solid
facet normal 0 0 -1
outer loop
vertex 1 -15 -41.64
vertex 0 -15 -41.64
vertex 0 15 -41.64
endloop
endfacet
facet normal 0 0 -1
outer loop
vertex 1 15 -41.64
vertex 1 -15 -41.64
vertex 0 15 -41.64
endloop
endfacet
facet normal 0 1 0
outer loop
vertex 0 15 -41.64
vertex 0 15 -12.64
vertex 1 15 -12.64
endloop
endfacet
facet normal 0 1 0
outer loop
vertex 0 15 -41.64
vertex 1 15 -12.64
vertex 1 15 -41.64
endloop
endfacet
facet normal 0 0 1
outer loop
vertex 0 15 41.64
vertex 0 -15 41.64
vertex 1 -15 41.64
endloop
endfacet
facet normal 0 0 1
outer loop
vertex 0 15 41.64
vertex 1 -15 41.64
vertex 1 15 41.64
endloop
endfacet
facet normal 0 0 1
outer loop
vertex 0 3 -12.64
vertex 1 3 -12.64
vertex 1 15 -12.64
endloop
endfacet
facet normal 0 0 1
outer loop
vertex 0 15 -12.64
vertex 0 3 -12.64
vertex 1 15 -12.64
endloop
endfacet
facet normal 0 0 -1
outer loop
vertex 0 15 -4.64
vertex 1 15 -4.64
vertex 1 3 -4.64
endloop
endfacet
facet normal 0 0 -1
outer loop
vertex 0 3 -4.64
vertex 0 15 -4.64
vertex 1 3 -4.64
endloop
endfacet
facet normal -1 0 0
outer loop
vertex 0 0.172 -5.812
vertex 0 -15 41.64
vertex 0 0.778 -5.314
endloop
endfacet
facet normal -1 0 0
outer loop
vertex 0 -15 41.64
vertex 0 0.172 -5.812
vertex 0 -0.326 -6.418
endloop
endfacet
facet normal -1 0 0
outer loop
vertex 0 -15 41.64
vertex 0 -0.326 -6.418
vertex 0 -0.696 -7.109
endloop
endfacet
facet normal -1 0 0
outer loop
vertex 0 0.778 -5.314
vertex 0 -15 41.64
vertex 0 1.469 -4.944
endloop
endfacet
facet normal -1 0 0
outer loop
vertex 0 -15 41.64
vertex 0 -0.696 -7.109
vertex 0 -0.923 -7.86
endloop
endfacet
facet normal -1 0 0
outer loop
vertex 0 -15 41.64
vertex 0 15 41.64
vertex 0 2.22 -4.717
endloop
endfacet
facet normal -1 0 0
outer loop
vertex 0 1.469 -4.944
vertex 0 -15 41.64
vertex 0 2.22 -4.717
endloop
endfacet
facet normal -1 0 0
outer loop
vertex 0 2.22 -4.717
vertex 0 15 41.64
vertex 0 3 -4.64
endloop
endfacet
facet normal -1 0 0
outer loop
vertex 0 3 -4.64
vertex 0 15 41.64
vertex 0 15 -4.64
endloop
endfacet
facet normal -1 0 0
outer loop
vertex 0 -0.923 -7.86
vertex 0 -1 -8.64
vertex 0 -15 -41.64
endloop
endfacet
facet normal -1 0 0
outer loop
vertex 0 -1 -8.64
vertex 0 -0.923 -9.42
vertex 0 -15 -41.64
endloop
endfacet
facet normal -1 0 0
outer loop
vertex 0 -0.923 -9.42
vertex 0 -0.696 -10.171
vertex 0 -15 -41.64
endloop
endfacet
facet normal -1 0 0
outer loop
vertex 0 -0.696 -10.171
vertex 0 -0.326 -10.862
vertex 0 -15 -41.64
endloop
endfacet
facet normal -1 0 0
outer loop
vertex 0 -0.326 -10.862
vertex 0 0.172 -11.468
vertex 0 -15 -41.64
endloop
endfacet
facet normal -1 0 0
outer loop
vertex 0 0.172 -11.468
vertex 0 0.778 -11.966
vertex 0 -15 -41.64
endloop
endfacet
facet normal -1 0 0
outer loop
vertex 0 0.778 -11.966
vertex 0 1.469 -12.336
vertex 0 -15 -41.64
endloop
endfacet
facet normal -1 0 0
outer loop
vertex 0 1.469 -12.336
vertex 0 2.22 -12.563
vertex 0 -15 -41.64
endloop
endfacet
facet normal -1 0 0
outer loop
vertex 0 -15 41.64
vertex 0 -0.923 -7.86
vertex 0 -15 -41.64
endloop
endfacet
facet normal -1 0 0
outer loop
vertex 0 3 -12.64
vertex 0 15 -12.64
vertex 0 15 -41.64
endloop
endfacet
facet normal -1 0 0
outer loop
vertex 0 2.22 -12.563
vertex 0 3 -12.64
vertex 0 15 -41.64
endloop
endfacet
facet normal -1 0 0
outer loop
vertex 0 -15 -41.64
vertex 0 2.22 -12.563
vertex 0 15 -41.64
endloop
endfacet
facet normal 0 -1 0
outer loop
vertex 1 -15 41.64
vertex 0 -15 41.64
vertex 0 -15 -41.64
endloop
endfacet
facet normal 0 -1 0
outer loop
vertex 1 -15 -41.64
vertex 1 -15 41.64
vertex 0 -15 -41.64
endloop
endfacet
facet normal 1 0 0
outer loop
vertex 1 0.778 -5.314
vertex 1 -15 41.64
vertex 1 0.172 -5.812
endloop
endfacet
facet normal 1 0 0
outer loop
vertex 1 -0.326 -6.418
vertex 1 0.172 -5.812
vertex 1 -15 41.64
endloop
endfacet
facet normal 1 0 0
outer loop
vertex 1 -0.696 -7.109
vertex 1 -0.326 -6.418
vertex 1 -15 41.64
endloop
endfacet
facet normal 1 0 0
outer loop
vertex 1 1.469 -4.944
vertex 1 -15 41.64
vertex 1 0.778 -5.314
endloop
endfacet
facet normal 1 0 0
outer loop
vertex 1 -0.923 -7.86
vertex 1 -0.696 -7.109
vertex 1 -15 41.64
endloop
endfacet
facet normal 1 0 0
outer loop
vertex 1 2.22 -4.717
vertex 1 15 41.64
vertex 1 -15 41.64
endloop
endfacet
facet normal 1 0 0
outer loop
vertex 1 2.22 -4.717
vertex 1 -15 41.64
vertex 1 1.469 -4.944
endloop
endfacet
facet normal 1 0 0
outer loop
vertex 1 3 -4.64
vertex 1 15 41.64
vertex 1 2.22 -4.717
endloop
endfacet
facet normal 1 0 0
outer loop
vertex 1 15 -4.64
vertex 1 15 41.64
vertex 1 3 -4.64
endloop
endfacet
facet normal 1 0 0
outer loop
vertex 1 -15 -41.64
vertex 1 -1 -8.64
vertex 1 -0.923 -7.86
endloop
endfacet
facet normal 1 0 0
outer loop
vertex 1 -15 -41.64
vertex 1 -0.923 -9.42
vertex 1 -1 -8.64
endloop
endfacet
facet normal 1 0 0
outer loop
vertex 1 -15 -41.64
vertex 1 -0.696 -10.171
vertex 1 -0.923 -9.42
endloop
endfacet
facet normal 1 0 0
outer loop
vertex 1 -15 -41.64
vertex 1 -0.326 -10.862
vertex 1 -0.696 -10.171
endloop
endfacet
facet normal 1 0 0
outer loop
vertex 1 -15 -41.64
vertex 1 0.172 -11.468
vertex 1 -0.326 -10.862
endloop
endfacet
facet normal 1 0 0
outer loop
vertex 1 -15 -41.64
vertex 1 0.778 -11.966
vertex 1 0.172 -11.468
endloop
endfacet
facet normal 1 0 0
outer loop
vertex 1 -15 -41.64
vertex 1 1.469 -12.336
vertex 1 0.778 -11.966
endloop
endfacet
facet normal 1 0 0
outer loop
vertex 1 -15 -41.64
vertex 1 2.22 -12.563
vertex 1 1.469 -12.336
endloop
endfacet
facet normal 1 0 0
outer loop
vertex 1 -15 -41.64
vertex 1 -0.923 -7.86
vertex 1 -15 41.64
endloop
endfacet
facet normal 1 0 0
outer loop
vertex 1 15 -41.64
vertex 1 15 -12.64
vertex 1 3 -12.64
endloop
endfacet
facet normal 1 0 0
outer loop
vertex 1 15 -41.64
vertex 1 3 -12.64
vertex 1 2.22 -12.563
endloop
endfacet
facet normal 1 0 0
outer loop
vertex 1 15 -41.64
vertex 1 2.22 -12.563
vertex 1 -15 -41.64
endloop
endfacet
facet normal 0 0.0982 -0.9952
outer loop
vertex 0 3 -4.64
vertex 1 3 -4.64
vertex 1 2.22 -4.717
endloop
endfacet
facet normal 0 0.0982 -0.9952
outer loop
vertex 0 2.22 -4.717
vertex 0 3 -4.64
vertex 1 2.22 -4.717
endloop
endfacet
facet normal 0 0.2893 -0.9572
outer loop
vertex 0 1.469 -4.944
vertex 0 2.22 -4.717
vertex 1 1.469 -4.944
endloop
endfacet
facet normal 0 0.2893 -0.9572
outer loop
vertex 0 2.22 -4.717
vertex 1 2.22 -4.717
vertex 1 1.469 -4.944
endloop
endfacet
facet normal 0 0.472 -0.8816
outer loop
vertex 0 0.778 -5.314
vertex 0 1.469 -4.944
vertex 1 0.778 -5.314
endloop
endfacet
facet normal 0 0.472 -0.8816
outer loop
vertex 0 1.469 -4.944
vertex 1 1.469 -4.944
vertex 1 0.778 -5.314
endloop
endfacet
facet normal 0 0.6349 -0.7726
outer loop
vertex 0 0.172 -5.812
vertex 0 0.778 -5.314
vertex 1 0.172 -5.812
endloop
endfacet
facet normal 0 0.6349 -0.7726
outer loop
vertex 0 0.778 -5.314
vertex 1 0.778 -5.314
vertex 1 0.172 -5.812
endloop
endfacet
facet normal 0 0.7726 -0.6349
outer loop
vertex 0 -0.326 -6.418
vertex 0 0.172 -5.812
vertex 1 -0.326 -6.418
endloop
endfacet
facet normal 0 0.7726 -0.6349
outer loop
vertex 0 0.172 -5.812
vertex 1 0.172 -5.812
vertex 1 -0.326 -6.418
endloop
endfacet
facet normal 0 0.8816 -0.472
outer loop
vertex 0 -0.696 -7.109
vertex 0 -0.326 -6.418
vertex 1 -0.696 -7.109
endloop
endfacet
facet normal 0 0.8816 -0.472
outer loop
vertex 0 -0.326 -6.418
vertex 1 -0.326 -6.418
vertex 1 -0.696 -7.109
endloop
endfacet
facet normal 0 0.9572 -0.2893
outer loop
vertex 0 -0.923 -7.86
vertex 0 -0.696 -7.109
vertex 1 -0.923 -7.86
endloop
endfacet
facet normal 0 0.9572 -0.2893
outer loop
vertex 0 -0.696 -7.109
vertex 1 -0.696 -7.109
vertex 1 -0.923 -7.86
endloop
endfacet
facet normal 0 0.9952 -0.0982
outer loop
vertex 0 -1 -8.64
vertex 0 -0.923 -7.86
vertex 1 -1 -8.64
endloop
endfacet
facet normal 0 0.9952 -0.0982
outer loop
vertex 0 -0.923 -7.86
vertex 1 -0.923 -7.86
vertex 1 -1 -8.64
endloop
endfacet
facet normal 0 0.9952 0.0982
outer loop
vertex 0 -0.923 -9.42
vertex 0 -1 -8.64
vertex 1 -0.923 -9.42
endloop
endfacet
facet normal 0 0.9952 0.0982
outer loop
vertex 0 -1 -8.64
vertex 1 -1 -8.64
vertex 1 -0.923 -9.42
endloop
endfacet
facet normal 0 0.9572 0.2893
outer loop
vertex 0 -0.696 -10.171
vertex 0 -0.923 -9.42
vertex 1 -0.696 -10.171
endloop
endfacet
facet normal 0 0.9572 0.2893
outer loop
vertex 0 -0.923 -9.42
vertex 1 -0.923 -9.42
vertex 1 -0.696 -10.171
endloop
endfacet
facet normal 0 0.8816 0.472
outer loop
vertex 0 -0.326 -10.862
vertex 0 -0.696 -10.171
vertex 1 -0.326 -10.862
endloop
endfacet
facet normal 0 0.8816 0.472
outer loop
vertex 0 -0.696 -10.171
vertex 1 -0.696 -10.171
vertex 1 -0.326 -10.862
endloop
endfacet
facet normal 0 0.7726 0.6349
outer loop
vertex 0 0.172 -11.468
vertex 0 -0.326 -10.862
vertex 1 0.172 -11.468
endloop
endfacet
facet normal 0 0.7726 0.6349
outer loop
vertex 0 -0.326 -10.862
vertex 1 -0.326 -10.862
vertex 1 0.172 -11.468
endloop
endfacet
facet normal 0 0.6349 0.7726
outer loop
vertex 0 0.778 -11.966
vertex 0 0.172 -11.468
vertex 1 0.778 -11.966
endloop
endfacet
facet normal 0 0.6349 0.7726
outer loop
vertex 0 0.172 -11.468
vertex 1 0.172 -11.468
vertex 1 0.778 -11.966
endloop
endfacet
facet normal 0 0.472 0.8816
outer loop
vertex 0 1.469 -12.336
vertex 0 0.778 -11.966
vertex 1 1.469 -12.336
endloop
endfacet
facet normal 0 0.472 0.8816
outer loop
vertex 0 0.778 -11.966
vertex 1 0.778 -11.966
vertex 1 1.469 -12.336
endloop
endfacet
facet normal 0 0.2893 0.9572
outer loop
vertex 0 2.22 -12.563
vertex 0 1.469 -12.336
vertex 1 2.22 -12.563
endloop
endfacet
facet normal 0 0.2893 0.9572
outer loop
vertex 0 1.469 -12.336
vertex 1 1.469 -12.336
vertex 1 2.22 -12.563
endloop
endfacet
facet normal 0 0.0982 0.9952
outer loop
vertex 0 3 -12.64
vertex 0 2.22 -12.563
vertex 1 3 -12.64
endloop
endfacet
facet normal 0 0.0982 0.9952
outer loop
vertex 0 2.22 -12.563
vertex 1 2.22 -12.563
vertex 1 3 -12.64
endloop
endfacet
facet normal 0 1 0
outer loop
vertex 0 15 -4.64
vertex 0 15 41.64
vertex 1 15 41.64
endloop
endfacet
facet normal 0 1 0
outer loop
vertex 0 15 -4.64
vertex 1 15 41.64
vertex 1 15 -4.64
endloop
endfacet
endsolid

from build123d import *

# Parameters (mm, degrees)
SKETCH1_W           = 83.28
SKETCH1_H           = 30
BOSS_EXTRUDE1_DEPTH = 1
CUT_EXTRUDE2_DEPTH  = 45.270640384


with BuildPart() as part:
    # Sketch1 → Boss-Extrude1 (new body)
    with BuildSketch(Plane(origin=(0, 0, 0), x_dir=(0, 0, -1), z_dir=(1, 0, 0))):
        Rectangle(SKETCH1_W, SKETCH1_H)
    extrude(amount=BOSS_EXTRUDE1_DEPTH)

    # Sketch3 → Cut-Extrude2 (cut, through all)
    with BuildSketch(Plane(origin=(1, 0, 0), x_dir=(0, 0, -1), z_dir=(1, 0, 0))):
        with BuildLine():
            Line((4.64, 15), (4.64, 3))
            ThreePointArc((4.64, 3), (8.64, 7), (12.64, 3))
            Line((12.64, 3), (12.64, 15))
            Line((12.64, 15), (4.64, 15))
        make_face()
        with BuildLine():
            ThreePointArc((12.64, 3), (8.64, 7), (4.64, 3))
            Line((4.64, 3), (12.64, 3))
        make_face()
        with BuildLine():
            Line((12.64, 3), (4.64, 3))
            ThreePointArc((4.64, 3), (8.64, -1), (12.64, 3))
        make_face()
    extrude(amount=-CUT_EXTRUDE2_DEPTH, mode=Mode.SUBTRACT)


solid = part.part
